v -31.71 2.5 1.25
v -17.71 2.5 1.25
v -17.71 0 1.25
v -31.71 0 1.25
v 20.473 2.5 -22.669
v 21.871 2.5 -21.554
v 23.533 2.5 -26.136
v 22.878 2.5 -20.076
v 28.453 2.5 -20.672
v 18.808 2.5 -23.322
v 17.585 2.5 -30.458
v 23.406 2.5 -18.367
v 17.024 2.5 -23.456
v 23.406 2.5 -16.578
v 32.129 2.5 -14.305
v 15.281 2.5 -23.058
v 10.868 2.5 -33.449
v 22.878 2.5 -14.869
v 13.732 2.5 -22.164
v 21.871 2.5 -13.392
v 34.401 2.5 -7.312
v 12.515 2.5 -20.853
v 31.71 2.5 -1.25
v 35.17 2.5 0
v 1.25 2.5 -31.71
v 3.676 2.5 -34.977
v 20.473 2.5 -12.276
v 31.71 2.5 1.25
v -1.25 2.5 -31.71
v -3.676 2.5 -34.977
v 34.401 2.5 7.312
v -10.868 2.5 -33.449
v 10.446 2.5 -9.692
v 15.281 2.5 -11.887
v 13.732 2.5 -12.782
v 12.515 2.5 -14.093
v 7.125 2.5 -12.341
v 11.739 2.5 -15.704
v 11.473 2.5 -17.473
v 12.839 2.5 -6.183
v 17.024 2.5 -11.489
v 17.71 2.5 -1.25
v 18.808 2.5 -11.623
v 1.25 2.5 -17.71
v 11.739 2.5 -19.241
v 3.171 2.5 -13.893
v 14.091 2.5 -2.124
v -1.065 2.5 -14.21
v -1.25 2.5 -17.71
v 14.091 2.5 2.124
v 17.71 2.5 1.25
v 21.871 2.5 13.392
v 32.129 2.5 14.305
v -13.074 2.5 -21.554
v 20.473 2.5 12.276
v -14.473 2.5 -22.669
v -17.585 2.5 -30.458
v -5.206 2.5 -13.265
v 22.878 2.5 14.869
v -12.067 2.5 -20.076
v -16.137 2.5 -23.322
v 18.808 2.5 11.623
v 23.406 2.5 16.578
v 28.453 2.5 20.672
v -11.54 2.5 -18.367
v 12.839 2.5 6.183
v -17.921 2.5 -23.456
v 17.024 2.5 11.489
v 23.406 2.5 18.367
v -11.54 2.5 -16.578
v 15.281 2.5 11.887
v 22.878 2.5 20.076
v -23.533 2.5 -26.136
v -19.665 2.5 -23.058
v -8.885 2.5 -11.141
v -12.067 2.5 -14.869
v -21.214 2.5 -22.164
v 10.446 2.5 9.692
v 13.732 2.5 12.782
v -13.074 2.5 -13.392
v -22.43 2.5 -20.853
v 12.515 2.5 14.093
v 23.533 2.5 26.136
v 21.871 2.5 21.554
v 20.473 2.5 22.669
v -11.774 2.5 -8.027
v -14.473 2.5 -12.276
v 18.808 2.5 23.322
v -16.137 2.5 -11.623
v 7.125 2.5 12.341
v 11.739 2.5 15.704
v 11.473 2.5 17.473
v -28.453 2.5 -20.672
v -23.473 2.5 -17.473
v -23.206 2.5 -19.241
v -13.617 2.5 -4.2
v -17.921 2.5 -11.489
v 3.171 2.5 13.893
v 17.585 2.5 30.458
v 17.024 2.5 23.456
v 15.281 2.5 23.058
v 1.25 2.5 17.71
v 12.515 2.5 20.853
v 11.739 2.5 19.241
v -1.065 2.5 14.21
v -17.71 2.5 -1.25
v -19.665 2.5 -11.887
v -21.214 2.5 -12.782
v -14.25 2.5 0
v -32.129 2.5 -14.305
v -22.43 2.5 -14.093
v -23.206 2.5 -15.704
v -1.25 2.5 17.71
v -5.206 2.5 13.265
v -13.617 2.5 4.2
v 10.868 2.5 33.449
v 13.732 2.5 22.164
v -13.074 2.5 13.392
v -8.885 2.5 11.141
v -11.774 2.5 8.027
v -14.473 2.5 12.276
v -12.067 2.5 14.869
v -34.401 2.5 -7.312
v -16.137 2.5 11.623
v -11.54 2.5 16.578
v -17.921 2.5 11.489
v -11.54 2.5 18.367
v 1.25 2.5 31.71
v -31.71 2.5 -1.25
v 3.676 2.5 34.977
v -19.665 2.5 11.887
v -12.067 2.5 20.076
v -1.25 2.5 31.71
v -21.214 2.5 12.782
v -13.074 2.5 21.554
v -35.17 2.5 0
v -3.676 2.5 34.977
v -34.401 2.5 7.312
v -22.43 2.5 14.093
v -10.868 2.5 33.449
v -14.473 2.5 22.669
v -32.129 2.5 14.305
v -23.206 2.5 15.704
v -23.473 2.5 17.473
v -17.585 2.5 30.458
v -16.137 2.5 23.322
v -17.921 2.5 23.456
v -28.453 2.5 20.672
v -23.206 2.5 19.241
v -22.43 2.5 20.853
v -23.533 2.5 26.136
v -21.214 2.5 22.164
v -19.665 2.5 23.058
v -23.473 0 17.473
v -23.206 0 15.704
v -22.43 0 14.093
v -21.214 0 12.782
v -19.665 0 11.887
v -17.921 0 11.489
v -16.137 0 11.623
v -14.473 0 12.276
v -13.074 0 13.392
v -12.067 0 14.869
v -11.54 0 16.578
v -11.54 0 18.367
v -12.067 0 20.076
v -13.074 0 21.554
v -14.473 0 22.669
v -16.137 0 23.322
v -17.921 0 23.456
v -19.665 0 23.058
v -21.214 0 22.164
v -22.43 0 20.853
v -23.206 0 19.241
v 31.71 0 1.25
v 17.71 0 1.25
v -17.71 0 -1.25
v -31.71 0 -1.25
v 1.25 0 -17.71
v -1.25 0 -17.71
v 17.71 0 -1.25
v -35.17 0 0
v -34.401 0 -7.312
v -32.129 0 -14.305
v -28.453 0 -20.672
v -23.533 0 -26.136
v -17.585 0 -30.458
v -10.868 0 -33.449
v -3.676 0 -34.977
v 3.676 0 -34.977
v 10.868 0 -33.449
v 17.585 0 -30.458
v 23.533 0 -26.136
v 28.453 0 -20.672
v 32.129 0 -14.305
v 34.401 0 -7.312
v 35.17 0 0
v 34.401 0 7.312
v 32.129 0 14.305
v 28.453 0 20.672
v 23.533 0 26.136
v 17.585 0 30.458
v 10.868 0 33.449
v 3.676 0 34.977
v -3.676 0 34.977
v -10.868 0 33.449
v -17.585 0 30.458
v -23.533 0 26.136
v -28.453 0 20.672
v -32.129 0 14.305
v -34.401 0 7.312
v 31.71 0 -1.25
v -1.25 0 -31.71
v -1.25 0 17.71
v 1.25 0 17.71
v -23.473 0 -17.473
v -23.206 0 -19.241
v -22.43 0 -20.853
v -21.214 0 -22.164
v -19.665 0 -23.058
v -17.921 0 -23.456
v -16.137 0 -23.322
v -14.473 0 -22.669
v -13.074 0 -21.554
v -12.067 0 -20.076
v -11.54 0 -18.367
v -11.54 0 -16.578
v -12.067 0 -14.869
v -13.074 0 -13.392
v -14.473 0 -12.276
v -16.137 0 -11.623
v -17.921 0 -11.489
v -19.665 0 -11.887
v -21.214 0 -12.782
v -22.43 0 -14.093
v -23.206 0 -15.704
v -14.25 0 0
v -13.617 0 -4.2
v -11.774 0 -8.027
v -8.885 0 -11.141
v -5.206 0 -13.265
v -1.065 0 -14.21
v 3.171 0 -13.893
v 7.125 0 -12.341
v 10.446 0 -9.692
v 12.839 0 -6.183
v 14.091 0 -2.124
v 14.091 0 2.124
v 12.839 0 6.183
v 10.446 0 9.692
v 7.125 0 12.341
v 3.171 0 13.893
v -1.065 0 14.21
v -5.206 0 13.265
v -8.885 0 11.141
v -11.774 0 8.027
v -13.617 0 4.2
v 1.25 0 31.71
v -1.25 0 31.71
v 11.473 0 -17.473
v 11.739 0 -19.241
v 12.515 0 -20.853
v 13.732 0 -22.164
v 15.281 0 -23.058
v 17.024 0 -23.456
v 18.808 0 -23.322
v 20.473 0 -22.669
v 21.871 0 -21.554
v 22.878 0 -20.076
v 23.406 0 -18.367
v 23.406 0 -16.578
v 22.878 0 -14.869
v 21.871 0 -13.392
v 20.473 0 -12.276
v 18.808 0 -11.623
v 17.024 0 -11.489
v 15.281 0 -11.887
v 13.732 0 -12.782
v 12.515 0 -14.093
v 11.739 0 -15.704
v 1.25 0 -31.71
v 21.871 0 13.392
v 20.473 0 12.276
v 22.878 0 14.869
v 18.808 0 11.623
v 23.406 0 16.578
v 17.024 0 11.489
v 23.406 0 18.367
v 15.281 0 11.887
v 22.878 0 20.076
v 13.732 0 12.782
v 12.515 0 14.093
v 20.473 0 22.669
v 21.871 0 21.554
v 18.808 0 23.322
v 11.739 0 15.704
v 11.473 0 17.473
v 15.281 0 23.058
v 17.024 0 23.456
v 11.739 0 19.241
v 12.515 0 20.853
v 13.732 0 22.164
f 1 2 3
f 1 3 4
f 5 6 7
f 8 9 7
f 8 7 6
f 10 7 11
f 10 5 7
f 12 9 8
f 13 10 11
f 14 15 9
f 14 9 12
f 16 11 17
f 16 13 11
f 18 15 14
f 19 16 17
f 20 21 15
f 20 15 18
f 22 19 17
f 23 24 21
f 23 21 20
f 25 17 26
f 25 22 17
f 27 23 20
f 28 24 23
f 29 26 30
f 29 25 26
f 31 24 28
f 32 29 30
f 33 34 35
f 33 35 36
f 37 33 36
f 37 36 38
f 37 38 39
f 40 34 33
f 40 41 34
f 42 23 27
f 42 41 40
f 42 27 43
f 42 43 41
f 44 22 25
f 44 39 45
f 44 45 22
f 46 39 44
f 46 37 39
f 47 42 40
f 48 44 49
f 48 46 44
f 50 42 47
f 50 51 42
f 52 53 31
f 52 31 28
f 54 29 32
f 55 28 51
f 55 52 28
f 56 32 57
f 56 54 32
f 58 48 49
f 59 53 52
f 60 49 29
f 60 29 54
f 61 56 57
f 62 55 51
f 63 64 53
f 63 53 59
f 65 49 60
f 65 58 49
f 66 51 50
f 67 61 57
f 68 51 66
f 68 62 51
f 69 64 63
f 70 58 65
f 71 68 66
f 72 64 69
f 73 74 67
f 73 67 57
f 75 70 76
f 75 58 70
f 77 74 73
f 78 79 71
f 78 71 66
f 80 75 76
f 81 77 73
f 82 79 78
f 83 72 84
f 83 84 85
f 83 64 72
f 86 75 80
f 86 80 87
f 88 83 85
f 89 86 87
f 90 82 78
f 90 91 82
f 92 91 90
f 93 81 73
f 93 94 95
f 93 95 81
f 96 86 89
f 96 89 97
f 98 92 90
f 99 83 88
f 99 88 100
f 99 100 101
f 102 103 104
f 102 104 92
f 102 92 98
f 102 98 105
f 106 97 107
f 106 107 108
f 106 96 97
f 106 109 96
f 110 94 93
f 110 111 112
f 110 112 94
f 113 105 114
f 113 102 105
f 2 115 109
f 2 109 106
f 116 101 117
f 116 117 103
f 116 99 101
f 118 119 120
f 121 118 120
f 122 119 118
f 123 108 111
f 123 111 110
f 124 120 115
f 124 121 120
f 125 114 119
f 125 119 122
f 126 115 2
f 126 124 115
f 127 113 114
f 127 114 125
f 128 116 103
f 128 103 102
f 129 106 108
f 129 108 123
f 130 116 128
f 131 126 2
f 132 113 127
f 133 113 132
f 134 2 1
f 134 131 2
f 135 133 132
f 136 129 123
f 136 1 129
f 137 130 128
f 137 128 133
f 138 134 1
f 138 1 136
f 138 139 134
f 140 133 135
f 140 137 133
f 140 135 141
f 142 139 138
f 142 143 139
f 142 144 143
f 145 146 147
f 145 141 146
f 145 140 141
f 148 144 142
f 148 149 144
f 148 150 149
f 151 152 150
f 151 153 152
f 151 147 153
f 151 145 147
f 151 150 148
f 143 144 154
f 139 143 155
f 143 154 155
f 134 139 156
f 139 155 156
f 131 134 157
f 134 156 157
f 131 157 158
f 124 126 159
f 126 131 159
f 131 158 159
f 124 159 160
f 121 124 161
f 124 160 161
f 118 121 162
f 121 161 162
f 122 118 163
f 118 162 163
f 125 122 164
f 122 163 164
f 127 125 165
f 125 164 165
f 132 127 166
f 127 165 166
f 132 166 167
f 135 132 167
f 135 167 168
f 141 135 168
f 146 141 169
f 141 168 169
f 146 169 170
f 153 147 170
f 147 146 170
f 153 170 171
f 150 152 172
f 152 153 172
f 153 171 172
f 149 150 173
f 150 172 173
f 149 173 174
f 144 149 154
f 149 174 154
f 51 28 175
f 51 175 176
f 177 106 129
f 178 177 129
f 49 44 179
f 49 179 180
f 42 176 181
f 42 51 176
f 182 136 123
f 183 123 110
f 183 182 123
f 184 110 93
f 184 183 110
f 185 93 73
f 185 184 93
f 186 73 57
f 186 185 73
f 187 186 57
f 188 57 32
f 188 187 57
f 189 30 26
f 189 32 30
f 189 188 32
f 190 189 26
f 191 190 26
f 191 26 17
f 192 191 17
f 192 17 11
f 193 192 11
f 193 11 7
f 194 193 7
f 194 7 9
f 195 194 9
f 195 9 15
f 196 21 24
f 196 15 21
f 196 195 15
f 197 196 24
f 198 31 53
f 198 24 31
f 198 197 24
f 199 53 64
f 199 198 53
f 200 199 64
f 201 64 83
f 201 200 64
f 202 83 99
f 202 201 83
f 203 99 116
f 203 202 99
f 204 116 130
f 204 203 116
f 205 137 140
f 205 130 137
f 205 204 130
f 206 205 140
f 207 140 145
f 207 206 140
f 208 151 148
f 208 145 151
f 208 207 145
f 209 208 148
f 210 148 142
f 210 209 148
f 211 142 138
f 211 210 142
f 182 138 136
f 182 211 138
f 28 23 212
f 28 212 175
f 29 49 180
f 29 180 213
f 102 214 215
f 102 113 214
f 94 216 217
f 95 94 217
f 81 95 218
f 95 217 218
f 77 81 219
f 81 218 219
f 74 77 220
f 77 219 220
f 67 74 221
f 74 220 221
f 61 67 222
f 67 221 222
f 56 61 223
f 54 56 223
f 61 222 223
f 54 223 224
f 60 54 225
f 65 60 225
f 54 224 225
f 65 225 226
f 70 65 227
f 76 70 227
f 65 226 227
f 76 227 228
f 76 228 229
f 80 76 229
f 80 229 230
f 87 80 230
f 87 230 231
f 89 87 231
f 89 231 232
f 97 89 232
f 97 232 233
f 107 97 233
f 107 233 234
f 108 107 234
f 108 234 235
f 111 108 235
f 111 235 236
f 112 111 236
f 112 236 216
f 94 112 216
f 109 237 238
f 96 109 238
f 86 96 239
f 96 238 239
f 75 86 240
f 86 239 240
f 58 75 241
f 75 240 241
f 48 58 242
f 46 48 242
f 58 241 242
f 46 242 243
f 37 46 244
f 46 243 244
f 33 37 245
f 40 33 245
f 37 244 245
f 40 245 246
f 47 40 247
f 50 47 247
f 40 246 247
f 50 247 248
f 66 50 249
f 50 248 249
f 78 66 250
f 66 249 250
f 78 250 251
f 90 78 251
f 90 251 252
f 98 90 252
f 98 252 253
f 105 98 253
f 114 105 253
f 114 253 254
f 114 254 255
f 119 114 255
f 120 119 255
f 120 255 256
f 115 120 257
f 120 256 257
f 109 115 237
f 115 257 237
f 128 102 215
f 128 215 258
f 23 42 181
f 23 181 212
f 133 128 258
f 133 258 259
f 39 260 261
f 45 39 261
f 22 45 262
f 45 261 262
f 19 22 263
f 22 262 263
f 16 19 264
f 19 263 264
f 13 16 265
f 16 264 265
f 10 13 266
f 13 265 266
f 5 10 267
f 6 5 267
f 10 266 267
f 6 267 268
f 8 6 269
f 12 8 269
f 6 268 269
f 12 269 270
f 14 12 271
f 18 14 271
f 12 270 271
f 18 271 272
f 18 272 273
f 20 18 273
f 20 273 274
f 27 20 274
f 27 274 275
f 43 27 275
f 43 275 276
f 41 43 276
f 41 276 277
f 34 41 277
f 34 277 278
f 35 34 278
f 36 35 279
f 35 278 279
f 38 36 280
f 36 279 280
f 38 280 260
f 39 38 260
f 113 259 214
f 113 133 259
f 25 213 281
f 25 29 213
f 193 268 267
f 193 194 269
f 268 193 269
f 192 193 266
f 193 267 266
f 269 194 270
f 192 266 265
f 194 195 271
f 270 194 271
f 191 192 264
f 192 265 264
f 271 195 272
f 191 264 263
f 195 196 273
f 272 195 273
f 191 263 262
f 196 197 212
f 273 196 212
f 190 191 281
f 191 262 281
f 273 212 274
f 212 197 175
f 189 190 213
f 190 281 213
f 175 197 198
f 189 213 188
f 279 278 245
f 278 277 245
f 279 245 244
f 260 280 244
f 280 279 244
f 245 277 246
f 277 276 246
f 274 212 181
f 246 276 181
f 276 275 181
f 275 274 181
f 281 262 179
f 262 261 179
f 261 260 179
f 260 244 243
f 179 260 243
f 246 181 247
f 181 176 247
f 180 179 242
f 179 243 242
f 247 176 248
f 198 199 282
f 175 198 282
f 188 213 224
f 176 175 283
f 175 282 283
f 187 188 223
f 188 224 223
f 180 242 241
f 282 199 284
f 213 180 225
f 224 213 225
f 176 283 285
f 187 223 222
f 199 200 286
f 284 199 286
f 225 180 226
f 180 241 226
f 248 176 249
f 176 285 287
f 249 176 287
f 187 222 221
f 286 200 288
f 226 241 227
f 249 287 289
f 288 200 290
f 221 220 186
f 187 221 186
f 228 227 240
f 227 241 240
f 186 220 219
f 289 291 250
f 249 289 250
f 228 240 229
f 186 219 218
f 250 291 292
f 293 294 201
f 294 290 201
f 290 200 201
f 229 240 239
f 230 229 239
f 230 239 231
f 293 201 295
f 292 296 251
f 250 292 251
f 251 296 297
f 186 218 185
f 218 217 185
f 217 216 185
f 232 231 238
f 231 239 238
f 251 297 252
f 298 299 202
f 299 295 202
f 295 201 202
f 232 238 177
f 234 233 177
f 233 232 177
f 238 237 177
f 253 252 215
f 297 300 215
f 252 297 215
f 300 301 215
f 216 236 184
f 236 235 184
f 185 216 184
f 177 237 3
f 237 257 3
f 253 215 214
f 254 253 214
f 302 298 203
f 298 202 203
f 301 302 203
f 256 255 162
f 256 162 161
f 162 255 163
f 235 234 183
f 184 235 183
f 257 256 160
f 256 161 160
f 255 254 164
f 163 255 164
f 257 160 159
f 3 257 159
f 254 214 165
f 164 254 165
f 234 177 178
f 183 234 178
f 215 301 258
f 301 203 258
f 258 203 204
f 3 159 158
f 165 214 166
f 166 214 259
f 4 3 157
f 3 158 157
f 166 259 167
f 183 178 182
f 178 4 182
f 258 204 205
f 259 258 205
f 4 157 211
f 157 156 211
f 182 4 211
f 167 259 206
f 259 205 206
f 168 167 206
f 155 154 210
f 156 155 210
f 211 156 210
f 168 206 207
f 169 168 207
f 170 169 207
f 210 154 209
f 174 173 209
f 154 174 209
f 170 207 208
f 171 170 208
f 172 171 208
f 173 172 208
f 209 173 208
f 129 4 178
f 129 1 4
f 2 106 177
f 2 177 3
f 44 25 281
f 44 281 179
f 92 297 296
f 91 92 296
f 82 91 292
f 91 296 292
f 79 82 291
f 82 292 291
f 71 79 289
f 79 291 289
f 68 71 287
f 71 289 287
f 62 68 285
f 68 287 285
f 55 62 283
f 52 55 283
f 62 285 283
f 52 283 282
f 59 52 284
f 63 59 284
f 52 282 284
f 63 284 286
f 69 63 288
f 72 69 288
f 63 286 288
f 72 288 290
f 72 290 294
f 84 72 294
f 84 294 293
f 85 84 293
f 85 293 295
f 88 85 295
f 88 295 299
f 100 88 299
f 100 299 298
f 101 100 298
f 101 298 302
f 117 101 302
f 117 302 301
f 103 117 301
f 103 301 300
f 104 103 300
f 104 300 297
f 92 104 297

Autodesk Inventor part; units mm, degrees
ref_plane "YZ Plane" through (0, 0, 0) normal (1, 0, 0) x (0, 1, 0)
ref_plane "XZ Plane" through (0, 0, 0) normal (0, 1, 0) x (-1, 0, 0)
ref_plane "XY Plane" through (0, 0, 0) normal (0, 0, 1) x (1, 0, 0)
sketch "Sketch1" plane through (0, 0, 0) normal (0, 1, 0) x (-1, 0, 0)
  circle A0 centre (0, 0) radius 35.17
  circle A1 centre (0, 0) radius 14.25
  line L0 (14.25, 0) -> (35.17, 0)
  line L1 (-17.4726, 17.4726) -> (36, -36)
  line L2 (0, 0) -> (50.9117, 0) construction
  line L3 (0, 0) -> (0, -35.17)
  line L4 (0, -35.17) -> (0, -14.25)
  circle A2 centre (0, 0) radius 24.71
  circle A3 centre (17.4726, -17.4726) radius 6
  line L5 (17.4726, 17.4726) -> (-36, -36)
  circle A4 centre (-17.4726, -17.4726) radius 6
  circle A5 centre (17.4726, 17.4726) radius 6
  circle A6 centre (-17.4726, 17.4726) radius 6
  point P0 (0, -24.71)
  dimension "d0" = 70.34
  dimension "d1" = 28.5
  dimension "d2" = 45
  dimension "d20" = 12
  dimension "d21" = 12
  dimension "d22" = 12
  dimension "d23" = 12
extrude "Extrusion1" add sketch "Sketch1" along normal blind 2.5 contours L0 A2 A5 A6 A4 L5 A0 | A0 L1 A3 A2 L0 | L5 A4 A2 L3 A0 | A0 L3 A2 A3 L1 | A2 A3 L1 A1 L0 | L0 A1 L5 A5 A2 | A2 A4 L5 A1 L3 | L3 A1 L1 A3 A2 | A2 A6 L1 A1 L5 A4 | A1 L1 A6 A2 A5 L5
sketch "Sketch2" plane through (0, 2.5, 0) normal (0, 1, 0) x (1, 0, 0)
  circle A0 centre (0, 0) radius 35.17 projected
  circle A1 centre (0, 0) radius 14.25 projected
  line L0 (-14.25, 0) -> (-35.17, 0)
  line L1 (-24.71, 0) -> (-24.71, 1.25)
  line L2 (-24.71, 1.25) -> (-24.71, -1.25)
  line L3 (-24.71, 1.25) -> (-31.71, 1.25)
  line L4 (-24.71, 1.25) -> (-17.71, 1.25)
  line L5 (-17.71, 1.25) -> (-17.71, -1.25)
  line L6 (-17.71, -1.25) -> (-31.71, -1.25)
  line L7 (-31.71, -1.25) -> (-31.71, 1.25)
  line L8 (-1.25, -24.71) -> (-1.25, -17.71)
  line L9 (-1.25, -17.71) -> (1.25, -17.71)
  line L10 (1.25, -17.71) -> (1.25, -31.71)
  line L11 (1.25, -31.71) -> (-1.25, -31.71)
  line L12 (-1.25, -24.71) -> (-1.25, -31.71)
  line L13 (24.71, -1.25) -> (17.71, -1.25)
  line L14 (17.71, -1.25) -> (17.71, 1.25)
  line L15 (17.71, 1.25) -> (31.71, 1.25)
  line L16 (31.71, 1.25) -> (31.71, -1.25)
  line L17 (24.71, -1.25) -> (31.71, -1.25)
  line L18 (1.25, 24.71) -> (1.25, 17.71)
  line L19 (1.25, 17.71) -> (-1.25, 17.71)
  line L20 (-1.25, 17.71) -> (-1.25, 31.71)
  line L21 (-1.25, 31.71) -> (1.25, 31.71)
  line L22 (1.25, 24.71) -> (1.25, 31.71)
  dimension "d24" = 1.25
  dimension "d25" = 2.5
  dimension "d26" = 7
  dimension "d27" = 7
  dimension "d30" = 360
extrude "Extrusion2" cut sketch "Sketch2" against normal blind 22.25 contours L7 L3 L1 L0 | L0 L2 L6 L7 | L1 L4 L5 L0 | L0 L5 L6 L2 | L8 L9 L10 L11 L12 | L13 L14 L15 L16 L17 | L18 L19 L20 L21 L22
pattern_circular "Circular Pattern1" count 4 over 360 about axis through (0, -10, 0) along (0, 1, 0) of "Extrusion2"
properties part number "Anillo de Centrado" material "MDF Medium Density Fiberboard"
